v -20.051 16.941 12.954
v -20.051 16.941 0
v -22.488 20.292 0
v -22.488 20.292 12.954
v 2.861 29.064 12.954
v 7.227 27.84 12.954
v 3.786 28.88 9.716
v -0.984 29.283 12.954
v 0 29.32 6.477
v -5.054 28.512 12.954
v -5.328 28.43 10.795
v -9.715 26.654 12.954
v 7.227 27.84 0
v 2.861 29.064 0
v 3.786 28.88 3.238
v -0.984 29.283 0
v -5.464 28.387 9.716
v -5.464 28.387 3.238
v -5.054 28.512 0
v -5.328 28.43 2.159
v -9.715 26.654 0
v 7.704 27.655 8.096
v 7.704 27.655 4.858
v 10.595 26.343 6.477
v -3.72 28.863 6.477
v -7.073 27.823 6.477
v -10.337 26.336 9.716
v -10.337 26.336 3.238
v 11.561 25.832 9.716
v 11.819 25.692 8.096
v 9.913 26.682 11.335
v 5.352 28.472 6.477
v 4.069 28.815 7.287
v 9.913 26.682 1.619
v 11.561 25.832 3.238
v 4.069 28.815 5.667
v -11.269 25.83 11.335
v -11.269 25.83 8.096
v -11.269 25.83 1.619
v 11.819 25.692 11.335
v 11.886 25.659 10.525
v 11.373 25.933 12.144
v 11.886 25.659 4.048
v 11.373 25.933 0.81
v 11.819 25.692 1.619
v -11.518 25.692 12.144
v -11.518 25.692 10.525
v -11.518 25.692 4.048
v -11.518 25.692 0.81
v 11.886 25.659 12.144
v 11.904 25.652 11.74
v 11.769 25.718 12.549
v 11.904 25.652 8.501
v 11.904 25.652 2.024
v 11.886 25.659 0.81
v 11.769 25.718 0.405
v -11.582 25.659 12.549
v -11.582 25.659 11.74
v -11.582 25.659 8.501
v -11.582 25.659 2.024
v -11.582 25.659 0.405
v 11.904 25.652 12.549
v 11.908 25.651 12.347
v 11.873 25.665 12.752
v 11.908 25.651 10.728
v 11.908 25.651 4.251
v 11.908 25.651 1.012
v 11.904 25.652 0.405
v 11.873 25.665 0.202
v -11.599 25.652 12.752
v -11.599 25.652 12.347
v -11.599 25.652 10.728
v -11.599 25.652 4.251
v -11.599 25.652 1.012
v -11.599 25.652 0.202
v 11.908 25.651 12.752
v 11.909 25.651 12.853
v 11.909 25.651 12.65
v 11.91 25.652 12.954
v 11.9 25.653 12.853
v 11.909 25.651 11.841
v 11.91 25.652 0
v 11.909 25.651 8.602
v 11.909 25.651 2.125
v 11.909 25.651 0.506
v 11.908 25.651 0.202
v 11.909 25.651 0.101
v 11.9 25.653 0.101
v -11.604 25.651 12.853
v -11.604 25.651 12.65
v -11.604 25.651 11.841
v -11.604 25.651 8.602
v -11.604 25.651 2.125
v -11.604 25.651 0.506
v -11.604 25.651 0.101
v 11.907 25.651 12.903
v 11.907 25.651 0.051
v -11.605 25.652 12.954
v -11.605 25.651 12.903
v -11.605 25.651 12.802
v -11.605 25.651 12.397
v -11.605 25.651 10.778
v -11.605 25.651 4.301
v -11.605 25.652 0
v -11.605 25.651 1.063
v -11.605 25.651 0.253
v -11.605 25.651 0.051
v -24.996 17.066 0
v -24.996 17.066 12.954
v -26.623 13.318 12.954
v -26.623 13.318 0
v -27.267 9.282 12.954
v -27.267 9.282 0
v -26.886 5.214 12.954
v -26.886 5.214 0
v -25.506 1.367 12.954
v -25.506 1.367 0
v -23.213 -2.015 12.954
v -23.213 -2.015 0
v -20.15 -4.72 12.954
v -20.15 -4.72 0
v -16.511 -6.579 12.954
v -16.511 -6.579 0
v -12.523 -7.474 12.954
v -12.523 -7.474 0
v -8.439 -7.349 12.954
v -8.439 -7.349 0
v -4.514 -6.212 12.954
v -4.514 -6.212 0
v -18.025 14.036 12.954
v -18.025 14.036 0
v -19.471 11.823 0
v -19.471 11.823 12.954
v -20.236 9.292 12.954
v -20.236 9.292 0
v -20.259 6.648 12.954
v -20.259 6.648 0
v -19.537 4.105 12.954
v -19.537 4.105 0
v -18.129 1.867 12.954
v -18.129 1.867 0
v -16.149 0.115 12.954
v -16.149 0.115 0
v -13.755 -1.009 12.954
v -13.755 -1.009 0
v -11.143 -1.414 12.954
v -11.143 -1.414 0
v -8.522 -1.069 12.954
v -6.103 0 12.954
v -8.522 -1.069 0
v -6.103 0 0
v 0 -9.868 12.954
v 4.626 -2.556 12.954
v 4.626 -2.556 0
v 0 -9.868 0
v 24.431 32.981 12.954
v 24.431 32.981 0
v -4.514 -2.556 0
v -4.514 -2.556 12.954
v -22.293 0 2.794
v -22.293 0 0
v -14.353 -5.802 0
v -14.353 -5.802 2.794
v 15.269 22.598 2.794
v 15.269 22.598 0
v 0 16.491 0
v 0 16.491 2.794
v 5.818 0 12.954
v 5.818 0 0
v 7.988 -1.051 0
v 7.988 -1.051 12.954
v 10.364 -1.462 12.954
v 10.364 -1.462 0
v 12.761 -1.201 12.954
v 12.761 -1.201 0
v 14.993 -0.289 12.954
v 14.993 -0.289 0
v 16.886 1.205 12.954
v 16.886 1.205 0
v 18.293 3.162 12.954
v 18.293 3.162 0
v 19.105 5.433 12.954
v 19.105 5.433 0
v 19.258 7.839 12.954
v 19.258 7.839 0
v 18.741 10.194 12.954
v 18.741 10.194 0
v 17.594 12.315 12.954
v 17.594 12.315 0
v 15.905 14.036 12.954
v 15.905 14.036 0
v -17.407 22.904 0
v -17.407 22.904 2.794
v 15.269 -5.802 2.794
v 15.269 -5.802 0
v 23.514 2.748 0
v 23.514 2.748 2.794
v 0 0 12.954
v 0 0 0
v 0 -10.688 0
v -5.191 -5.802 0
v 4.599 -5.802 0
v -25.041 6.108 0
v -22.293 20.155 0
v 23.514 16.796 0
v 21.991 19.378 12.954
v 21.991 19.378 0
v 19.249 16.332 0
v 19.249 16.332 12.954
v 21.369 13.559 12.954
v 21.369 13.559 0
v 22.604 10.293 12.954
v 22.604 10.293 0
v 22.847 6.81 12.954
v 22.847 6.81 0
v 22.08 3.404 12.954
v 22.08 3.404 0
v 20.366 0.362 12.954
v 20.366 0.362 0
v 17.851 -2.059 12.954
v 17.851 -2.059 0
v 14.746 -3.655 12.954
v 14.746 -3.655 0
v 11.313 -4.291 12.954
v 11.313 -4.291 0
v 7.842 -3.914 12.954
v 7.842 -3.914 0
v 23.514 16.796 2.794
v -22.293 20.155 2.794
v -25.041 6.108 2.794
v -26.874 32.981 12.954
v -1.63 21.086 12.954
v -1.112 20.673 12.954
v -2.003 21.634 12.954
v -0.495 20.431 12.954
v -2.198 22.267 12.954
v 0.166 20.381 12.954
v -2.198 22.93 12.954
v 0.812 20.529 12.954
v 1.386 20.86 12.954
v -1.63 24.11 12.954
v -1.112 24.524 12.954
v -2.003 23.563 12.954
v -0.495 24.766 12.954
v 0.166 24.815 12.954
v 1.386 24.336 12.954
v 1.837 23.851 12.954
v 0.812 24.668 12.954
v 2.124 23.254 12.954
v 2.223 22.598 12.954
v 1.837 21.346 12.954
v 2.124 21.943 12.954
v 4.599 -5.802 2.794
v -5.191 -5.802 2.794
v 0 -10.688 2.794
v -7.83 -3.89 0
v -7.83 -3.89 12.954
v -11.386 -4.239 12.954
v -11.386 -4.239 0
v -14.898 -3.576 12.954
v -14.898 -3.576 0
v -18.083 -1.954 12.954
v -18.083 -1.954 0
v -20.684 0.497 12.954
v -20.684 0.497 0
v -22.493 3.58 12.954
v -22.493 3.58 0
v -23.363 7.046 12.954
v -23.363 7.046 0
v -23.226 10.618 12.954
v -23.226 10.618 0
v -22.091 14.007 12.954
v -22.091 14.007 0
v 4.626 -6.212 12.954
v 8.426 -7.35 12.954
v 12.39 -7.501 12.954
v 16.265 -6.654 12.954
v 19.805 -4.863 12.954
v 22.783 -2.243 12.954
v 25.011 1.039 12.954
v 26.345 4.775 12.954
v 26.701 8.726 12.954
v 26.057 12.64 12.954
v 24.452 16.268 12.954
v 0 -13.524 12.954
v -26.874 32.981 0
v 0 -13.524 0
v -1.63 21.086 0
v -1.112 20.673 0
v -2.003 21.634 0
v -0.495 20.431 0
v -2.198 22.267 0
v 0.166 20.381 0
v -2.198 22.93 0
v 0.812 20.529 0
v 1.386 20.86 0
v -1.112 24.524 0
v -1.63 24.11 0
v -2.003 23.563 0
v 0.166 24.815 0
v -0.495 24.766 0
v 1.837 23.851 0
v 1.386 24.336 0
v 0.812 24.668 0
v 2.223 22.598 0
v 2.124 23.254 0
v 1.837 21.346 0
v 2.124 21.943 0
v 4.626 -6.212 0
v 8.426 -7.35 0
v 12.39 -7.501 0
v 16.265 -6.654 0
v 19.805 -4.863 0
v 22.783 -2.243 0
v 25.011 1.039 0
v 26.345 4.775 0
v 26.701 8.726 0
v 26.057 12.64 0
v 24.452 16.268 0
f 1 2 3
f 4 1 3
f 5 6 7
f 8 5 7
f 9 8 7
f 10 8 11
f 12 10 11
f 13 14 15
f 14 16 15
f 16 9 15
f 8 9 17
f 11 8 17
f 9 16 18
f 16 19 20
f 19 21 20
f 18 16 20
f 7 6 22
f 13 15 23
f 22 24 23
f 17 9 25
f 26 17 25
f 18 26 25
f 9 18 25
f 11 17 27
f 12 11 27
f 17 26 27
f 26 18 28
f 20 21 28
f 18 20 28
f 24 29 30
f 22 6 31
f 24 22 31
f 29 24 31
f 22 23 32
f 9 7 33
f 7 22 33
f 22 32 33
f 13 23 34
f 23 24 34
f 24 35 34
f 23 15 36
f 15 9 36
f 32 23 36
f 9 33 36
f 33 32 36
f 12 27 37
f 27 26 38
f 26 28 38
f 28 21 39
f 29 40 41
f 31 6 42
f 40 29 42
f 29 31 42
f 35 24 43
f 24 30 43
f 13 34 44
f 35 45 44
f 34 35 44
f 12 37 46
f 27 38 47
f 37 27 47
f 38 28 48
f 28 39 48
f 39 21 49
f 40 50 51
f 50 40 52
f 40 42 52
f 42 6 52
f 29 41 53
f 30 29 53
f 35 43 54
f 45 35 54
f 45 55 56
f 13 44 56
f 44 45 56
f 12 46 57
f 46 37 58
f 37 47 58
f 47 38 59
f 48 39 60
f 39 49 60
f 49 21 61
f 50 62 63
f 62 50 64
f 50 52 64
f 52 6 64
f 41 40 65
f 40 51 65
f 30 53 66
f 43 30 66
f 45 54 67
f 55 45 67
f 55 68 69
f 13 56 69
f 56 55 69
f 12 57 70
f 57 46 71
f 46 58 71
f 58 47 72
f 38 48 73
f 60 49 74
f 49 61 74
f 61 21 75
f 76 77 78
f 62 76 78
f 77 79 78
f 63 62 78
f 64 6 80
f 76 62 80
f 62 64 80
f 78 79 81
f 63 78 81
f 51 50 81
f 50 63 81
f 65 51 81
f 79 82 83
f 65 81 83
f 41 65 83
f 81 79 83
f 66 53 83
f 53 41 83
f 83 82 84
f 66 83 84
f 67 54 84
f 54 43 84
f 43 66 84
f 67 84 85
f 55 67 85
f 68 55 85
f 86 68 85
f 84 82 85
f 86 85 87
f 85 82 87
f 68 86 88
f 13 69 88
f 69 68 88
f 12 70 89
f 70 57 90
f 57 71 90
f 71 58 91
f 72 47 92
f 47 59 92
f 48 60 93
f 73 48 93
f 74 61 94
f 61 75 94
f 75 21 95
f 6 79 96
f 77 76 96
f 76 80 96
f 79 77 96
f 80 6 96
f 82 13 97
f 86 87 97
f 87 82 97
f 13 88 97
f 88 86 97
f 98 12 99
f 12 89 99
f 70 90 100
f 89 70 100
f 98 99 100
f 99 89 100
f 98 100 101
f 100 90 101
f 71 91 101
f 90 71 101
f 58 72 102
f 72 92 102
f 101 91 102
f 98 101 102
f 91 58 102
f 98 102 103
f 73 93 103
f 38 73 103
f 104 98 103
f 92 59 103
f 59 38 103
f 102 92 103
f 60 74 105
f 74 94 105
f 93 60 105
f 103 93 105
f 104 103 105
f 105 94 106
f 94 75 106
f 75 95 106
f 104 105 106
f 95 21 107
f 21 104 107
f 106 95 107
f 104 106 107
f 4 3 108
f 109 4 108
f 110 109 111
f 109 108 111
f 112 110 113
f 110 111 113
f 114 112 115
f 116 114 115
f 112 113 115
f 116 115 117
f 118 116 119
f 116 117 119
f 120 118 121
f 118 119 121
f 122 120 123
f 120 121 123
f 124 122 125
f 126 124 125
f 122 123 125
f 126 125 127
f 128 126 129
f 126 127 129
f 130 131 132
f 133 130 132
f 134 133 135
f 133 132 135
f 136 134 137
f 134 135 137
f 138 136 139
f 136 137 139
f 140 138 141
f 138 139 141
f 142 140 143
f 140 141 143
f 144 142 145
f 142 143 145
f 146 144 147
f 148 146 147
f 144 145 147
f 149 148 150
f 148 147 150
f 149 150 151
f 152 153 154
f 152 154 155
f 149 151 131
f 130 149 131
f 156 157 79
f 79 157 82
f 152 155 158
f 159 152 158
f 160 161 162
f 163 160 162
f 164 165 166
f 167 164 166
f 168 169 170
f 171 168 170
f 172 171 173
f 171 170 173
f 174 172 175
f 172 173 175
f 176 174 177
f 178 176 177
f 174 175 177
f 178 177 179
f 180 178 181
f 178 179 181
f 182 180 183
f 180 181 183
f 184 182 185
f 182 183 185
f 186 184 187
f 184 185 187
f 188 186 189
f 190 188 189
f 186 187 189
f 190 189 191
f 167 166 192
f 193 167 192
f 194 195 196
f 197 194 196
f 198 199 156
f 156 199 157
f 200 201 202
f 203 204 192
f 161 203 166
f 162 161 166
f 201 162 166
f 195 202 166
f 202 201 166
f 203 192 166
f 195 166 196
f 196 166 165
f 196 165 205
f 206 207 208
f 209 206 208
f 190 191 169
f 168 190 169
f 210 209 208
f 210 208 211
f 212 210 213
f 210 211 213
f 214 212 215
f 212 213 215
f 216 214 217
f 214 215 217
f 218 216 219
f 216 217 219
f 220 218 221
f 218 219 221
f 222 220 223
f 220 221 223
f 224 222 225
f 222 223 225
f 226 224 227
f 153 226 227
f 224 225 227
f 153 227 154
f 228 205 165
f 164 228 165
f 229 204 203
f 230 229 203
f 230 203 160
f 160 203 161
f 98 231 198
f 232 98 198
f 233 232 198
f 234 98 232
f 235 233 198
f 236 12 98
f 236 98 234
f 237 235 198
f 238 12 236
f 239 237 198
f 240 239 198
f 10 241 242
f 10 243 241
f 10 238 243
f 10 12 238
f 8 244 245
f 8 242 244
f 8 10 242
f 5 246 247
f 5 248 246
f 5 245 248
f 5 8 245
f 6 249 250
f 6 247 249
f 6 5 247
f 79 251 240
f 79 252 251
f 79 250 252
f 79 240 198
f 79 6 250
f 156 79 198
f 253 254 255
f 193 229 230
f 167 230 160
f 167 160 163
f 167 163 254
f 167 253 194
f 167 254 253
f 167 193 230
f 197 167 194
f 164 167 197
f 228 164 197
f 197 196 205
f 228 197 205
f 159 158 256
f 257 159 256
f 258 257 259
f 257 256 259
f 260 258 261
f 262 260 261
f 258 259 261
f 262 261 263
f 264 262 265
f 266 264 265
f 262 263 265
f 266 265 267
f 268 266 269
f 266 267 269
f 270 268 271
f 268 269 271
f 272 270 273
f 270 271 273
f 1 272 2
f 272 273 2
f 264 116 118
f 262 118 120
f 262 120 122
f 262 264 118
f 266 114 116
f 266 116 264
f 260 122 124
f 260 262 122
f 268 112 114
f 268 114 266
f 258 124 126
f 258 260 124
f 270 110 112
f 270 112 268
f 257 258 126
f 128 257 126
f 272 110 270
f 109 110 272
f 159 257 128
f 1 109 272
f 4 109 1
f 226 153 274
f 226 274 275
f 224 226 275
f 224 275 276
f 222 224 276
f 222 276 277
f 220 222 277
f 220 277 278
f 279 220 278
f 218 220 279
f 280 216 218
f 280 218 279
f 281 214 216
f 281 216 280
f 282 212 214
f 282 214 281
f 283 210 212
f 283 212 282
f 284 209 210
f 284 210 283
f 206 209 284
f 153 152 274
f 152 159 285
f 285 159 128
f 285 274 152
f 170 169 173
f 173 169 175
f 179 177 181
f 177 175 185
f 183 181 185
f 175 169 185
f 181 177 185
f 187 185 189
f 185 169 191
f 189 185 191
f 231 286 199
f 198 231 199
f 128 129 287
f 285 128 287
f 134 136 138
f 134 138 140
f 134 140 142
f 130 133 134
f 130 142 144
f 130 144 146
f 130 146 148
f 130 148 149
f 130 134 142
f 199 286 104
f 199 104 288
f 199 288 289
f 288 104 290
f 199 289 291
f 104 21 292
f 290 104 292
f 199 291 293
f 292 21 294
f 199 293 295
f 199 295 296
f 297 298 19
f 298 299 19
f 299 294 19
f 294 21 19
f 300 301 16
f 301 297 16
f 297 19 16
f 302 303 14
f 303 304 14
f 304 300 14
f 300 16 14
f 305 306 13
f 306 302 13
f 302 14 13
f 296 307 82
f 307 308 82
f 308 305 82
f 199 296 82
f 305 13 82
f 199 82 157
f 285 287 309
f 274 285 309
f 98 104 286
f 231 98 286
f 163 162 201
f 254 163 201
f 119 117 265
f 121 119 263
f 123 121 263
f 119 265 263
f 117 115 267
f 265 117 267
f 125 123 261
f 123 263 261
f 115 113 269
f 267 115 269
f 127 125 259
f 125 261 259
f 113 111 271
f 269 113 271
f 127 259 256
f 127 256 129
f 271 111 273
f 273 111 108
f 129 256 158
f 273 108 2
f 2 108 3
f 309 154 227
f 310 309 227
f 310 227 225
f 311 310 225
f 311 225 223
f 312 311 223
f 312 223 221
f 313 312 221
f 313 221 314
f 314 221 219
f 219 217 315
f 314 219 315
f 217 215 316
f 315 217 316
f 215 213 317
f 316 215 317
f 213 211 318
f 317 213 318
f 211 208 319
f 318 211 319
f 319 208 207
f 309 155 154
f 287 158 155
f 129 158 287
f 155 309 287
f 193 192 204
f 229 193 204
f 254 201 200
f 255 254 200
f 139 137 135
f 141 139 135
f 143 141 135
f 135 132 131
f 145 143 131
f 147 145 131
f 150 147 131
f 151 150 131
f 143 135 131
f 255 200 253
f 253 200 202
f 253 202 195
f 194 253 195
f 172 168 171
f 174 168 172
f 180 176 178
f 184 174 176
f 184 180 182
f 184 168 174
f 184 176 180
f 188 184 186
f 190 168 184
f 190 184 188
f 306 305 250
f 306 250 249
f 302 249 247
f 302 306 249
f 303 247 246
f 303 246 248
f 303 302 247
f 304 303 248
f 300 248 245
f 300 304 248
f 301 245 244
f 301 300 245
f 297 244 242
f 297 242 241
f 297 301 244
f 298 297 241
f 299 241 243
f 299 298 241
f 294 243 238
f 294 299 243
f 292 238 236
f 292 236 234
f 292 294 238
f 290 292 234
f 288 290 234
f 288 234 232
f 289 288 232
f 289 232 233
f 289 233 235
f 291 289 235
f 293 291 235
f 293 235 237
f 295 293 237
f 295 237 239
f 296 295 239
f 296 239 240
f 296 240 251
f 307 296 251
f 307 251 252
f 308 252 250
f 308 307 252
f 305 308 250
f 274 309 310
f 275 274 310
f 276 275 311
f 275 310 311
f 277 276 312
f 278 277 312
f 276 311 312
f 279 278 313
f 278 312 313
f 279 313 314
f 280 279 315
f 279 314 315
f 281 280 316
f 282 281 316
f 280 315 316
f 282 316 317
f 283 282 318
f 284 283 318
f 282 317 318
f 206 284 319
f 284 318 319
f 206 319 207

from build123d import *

# Parameters (mm, degrees)
F0_R     = 2.223213263
F3_DEPTH = 12.954
F5_DEPTH = 2.794


with BuildPart() as f3:
    # F0 (on Top) → F3 (new body)
    with BuildSketch(Plane.XY):
        with BuildLine():
            Line((-11.6053866223, 25.6520602852), (-26.873588562, 32.9812206328))
            Line((-26.873588562, 32.9812206328), (0, 0))
            Line((0, 0), (24.4305338711, 32.9812206328))
            Line((24.4305338711, 32.9812206328), (11.9098844007, 25.6520602852))
            add(Edge.make_bspline(
                [(11.9098844007, 25.6520602852), (11.8950853565, 25.5826867073), (-0.0138297746, 33.0575249946), (-11.5902944104, 25.5834590306), (-11.6053866223, 25.6520602852)],
                knots=[0, 0, 0, 0, 0.2509945987, 0.4990446693, 0.4990446693, 0.4990446693, 0.4990446693], degree=3))
        make_face()
        with Locations((0, 22.5982442498)):
            Circle(F0_R, mode=Mode.SUBTRACT)
    extrude(amount=F3_DEPTH)


with BuildPart() as f3b:
    # F1 (on Top) → F3, piece 2 (new body)
    with BuildSketch(Plane.XY):
        with BuildLine():
            ThreePointArc((-18.0245786905, 14.0363797545), (-18.1290018819, 1.8669864944), (-6.1032213271, 0))
            Line((-6.1032213271, 0), (-18.0245786905, 14.0363797545))
        make_face()
    extrude(amount=F3_DEPTH)


with BuildPart() as f3c:
    # F1 (on Top) → F3, piece 3 (new body)
    with BuildSketch(Plane.XY):
        with BuildLine():
            Line((15.905437991, 14.0363797545), (5.8181360364, 0))
            ThreePointArc((5.8181360364, 0), (17.6578116159, 2.1341988873), (15.905437991, 14.0363797545))
        make_face()
    extrude(amount=F3_DEPTH)


with BuildPart() as f3d:
    # F2 (on Top) → F3, piece 4 (new body)
    with BuildSketch(Plane.XY):
        with BuildLine():
            ThreePointArc((19.2488413304, 16.3319613785), (20.3661650087, 0.3623127877), (4.6257572249, -2.5561887305))
            Line((4.6257572249, -2.5561887305), (0, -9.8677305505))
            Line((0, -9.8677305505), (-4.513671156, -2.5561887305))
            ThreePointArc((-4.513671156, -2.5561887305), (-20.6843016825, 0.4970969832), (-20.0506988913, 16.9412568212))
            Line((-20.0506988913, 16.9412568212), (-22.4878787994, 20.2923808247))
            ThreePointArc((-22.4878787994, 20.2923808247), (-24.4657536531, -0.3958093223), (-4.513671156, -6.2119596405))
            Line((-4.513671156, -6.2119596405), (0, -13.5235014604))
            Line((0, -13.5235014604), (4.6257572249, -6.2119596405))
            ThreePointArc((4.6257572249, -6.2119596405), (24.0009877864, -0.6725727455), (21.9906680286, 19.3784367293))
            Line((21.9906680286, 19.3784367293), (19.2488413304, 16.3319613785))
        make_face()
    extrude(amount=F3_DEPTH)


with BuildPart() as f5:
    # F4 (on Top) → F5 (new body)
    with BuildSketch(Plane.XY):
        Polygon((0, 16.4906103164), (-17.4067560583, 22.903624922), (-22.292861715, 20.1551914215), (-25.0412989408, 6.1076334678), (-22.292861715, 0), (-14.3529400229, -5.8022523299), (-5.1914886571, -5.8022523299), (0, -10.6883598492), (4.5986899455, -5.8022523299), (15.2690857649, -5.8022523299), (23.5143899918, 2.7484351303), (23.5143899918, 12.2152669355), (23.5143899918, 16.7959928513), (15.2690857649, 22.5982442498), align=None)
    extrude(amount=F5_DEPTH)


solid = Compound([f3.part, f3b.part, f3c.part, f3d.part, f5.part])
